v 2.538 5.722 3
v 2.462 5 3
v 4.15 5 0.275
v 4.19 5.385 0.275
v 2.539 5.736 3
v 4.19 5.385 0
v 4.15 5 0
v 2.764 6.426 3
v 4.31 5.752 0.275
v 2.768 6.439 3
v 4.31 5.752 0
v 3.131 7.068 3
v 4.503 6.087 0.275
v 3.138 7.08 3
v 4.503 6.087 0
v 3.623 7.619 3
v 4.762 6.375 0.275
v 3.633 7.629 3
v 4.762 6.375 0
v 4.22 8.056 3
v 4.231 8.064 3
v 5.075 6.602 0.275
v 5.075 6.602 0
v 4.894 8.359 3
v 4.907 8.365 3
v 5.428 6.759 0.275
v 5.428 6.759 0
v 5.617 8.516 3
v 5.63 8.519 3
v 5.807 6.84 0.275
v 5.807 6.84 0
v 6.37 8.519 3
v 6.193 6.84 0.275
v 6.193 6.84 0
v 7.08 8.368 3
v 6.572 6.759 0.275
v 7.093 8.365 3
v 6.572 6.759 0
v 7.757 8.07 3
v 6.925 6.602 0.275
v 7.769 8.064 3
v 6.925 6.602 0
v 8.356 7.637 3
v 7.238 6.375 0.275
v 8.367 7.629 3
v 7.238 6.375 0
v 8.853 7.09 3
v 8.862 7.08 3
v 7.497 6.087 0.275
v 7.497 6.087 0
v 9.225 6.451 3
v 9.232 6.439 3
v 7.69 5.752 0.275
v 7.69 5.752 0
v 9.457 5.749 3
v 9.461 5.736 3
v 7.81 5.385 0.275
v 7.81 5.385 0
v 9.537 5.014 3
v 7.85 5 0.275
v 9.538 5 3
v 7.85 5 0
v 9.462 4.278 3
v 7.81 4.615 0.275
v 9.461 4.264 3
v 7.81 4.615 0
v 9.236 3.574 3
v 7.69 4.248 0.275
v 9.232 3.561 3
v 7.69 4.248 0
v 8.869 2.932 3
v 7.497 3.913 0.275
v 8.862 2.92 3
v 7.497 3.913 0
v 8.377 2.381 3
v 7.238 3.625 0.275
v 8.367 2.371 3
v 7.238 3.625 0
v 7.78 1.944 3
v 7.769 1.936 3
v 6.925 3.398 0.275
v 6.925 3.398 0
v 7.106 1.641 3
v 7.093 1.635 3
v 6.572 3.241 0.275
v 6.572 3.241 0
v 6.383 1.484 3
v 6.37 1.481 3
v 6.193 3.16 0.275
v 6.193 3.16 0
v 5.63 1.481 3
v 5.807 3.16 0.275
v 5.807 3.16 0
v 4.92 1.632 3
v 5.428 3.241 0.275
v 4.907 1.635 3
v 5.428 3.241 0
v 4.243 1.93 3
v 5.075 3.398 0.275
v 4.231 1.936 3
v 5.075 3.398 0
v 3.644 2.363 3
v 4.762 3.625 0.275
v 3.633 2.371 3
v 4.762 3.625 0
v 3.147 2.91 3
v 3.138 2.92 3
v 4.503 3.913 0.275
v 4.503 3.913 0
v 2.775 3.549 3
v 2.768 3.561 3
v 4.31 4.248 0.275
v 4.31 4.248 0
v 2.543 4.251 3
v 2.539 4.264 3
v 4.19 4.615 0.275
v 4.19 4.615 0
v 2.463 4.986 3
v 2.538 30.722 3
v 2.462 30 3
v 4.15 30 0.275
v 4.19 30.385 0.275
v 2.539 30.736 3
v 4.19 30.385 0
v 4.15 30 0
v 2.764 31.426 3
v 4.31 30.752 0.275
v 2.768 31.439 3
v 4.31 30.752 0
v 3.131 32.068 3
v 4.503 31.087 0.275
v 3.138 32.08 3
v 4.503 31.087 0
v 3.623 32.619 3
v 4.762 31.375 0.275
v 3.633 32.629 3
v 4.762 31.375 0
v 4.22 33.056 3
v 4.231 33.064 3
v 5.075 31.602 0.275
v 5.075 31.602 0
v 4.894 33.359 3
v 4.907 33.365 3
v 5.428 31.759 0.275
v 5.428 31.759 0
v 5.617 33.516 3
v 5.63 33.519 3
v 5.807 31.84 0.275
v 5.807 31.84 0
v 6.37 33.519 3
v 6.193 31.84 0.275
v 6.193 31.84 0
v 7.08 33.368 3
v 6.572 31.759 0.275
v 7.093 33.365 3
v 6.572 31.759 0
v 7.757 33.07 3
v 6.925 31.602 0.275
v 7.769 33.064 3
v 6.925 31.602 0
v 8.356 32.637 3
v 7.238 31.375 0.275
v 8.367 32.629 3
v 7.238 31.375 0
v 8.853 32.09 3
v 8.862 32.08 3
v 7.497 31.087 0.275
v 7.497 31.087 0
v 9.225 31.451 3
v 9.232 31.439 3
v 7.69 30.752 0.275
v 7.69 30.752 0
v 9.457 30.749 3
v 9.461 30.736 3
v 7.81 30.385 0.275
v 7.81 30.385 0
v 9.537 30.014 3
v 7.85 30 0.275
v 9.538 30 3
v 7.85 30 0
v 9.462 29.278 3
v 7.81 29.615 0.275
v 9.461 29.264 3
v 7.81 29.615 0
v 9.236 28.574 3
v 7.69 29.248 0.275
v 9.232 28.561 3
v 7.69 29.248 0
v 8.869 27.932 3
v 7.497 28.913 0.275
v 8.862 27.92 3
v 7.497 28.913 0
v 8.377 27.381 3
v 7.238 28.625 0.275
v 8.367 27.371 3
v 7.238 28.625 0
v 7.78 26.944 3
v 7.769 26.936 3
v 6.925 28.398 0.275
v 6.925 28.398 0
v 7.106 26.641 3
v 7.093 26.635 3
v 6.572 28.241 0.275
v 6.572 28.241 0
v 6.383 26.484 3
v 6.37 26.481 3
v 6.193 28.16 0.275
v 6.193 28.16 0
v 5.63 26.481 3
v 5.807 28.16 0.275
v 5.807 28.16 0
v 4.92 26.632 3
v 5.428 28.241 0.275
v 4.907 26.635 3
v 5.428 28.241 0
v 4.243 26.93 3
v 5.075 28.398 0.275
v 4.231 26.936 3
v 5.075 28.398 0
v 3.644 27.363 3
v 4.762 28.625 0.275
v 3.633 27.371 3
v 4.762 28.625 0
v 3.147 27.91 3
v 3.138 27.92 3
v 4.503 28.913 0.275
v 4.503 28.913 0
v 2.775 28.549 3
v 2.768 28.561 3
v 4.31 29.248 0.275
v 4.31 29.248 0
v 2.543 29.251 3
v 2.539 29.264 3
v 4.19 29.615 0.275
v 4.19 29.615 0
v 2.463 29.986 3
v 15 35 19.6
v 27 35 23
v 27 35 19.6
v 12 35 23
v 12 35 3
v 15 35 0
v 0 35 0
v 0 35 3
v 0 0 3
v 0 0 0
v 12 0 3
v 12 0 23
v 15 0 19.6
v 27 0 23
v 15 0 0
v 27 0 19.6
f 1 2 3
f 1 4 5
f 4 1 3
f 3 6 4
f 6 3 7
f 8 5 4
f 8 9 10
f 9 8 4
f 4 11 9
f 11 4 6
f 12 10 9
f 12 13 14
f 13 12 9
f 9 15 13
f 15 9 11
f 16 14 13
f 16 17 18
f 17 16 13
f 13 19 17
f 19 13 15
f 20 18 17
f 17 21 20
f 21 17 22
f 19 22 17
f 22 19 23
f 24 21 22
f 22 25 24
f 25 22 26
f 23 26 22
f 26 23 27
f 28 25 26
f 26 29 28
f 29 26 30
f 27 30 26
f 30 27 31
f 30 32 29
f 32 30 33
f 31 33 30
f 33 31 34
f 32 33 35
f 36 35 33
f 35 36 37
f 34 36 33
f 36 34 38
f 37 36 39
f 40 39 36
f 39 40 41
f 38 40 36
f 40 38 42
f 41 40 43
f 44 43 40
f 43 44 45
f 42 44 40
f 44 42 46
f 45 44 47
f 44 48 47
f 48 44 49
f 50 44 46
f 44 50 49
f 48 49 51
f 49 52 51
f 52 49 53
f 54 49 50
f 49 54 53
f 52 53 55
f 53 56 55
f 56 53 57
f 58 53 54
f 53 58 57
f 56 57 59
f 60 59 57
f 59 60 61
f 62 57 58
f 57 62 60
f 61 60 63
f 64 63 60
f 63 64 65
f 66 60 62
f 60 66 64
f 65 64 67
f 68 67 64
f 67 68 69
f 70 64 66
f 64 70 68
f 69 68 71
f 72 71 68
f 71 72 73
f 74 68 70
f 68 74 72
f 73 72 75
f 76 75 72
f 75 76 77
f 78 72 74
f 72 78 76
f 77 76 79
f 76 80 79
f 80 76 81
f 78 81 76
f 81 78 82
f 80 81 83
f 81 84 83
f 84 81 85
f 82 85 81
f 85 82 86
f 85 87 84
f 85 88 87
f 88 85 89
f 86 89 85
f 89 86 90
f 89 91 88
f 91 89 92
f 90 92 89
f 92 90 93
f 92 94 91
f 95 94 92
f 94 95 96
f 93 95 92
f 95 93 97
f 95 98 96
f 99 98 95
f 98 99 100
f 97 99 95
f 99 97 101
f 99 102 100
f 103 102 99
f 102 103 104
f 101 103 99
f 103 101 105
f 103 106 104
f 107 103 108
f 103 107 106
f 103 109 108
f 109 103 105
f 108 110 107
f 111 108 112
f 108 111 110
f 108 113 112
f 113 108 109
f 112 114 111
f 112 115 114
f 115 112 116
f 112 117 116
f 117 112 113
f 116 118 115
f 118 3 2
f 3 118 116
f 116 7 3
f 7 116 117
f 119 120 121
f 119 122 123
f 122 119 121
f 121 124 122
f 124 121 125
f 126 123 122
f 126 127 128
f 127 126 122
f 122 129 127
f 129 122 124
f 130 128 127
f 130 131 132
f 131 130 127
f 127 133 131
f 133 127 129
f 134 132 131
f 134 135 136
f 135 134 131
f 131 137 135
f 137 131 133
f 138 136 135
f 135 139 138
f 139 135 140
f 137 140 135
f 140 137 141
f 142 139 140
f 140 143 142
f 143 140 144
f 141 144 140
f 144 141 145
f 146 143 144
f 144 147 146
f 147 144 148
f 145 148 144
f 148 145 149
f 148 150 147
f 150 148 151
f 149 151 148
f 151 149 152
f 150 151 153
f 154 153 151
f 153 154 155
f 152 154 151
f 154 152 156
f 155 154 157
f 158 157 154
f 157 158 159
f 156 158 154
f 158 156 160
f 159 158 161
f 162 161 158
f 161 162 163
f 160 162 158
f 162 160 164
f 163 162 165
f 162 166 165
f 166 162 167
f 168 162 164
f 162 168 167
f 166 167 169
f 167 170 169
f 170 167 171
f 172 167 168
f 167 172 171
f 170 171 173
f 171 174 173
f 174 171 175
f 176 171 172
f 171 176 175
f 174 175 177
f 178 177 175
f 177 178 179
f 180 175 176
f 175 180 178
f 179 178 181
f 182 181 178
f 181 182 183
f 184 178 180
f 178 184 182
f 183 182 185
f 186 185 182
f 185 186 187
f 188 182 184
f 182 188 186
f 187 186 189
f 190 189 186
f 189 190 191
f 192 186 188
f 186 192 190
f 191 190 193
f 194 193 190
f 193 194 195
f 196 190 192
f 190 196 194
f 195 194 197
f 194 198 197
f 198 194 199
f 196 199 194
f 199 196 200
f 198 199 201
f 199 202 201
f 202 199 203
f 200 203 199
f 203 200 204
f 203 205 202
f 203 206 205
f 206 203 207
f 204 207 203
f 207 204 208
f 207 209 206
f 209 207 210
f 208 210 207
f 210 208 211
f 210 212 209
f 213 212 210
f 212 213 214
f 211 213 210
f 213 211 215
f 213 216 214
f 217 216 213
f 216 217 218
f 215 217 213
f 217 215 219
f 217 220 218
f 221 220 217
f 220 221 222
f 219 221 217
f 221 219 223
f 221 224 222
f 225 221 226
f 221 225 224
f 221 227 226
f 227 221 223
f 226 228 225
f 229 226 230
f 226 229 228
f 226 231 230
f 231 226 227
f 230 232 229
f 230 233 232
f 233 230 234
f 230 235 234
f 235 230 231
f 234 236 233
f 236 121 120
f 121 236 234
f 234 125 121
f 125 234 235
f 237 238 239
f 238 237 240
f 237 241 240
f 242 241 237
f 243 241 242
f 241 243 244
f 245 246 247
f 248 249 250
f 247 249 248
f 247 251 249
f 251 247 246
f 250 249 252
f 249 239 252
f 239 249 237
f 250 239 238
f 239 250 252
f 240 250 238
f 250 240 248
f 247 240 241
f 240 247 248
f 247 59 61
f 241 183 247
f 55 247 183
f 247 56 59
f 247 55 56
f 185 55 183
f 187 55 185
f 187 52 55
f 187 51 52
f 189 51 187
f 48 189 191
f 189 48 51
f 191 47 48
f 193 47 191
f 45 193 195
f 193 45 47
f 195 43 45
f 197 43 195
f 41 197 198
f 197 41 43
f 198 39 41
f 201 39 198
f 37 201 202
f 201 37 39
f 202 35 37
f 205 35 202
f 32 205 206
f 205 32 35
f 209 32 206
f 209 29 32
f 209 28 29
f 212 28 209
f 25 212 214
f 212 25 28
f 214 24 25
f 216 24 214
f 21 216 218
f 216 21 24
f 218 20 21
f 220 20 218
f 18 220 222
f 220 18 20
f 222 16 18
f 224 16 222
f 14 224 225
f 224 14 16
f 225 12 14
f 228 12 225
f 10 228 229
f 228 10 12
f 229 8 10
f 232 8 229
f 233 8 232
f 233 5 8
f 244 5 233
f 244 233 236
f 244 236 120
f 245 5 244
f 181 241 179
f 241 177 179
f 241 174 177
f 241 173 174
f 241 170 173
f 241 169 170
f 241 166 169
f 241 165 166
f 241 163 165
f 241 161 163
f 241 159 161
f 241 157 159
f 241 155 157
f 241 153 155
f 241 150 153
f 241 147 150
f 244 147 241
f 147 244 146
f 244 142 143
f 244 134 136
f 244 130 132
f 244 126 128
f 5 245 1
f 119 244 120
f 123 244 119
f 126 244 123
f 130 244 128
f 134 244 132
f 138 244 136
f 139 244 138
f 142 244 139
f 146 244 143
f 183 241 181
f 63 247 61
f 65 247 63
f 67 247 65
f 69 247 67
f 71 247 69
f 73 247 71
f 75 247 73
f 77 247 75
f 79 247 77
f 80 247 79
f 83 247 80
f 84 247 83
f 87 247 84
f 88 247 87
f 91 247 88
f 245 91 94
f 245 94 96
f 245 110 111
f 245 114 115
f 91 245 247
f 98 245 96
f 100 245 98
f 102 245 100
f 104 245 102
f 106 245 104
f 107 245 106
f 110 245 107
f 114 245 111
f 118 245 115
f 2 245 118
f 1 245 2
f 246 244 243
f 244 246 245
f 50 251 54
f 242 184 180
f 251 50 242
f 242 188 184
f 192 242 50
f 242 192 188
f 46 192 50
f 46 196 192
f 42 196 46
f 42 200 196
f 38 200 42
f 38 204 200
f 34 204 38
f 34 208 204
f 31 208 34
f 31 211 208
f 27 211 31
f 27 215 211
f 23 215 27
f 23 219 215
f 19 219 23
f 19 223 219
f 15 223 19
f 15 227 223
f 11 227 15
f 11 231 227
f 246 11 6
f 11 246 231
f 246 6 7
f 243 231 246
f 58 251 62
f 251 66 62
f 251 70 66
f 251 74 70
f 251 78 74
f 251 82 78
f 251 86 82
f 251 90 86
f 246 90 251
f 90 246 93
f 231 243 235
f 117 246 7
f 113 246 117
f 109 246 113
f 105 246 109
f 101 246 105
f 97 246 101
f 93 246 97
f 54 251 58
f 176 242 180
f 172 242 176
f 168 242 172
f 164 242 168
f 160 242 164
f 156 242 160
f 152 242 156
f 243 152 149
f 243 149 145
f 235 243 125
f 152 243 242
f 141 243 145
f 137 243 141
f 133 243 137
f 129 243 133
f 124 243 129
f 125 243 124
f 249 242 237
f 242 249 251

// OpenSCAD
// file: Parts/Screw.scad
// created by IndiePandaaaaa | Lukas

function cone_diameter(diameter) = diameter * 2;

function cone_height(diameter) = diameter * 0.75;

module screw(diameter, length, cutout_sample = false, fs = 0.1, fa = 1) {
    //$fs = 0.1; [size in mm] | $fa = 1; [degrees]
    //$fn = 100; [defined faces]

    module base_model(diameter, length, cone_height, cone_diameter, offset = 0, fs = 0.1, fa = 1) {
        rotate_extrude($fs = fs) {
            polygon([
                    [0, 0],
                    [(diameter + offset) / 2, 0],
                    [(diameter + offset) / 2, (length + offset) - (cone_height + offset)],
                    [(cone_diameter + offset) / 2, length + offset],
                    [0, length + offset],
                ]);
        }
    }

    if (length < diameter) {
        echo("Screw is too short");
        length = diameter + 1;
        echo("New length is: ", length);
    }

    if (!cutout_sample) {
        translate([0, 0, - length])
            difference() {
                base_model(diameter, length, cone_height(diameter), cone_diameter(diameter));

                // top cross part
                translate([0, 0, length + 0.1 - (cone_height(diameter) - diameter / 2)])
                    difference() {
                        rotate([0, 0, 45])
                            rotate_extrude($fn = 4) {
                                polygon([
                                        [0, 0],
                                        [diameter * 1.4 / 2, 0],
                                        [cone_diameter(diameter) / 2, cone_height(diameter) - diameter / 2],
                                        [0, cone_height(diameter) - diameter / 2],
                                    ]);
                            }
                        for (i = [0 : 1 : 3]) {
                            rotate([0, 0, 90 * i])
                                translate([diameter / 3.18 / 2, diameter / 3.18 / 2, - 0.1])
                                    cube(cone_height(diameter) + 0.2);
                        }
                    }
            }
    } else {
        offset = 0.2;
        translate([0, 0, - length - offset / 2])
            base_model(diameter, length, cone_height(diameter), cone_diameter(diameter), offset);
    }
}

screw(3.5, 12);
// main file
// created by IndiePandaaaaa|Lukas

use <Parts/Screw.scad>

TOLERANCE = 0.1;
THICKNESS = 3;
SCREW_OD = 3.5;

SCREWS_2 = true;
SCREWS_2_DIST = 25;  // fixme: 2.54 ??

BRACKET_INNER_HEIGHT = 20;
BRACKET_SCREW_DEPTH = 12;
BRACKET_UPPER_WIDTH = 12;
BRACKET_WIDTH = SCREWS_2_DIST + SCREW_OD * 2 + 1.5 * 2; // if too low SCREWS_2 has priority

difference() {
    translate([0, BRACKET_WIDTH, 0]) rotate([90, 0, 0])
        linear_extrude(BRACKET_WIDTH) {
            polygon([
                    [0, 0],
                    [BRACKET_SCREW_DEPTH + THICKNESS, 0],
                    [BRACKET_SCREW_DEPTH + THICKNESS, BRACKET_INNER_HEIGHT + TOLERANCE - 0.5],
                // -0.5 fitting for device
                    [BRACKET_SCREW_DEPTH + THICKNESS + BRACKET_UPPER_WIDTH, BRACKET_INNER_HEIGHT + TOLERANCE - 0.5],
                    [BRACKET_SCREW_DEPTH + THICKNESS + BRACKET_UPPER_WIDTH, BRACKET_INNER_HEIGHT + THICKNESS],
                    [BRACKET_SCREW_DEPTH, BRACKET_INNER_HEIGHT + THICKNESS],
                    [BRACKET_SCREW_DEPTH, THICKNESS],
                    [0, THICKNESS],
                ]);
        }

    for (i = [0:1]) {
        if (SCREWS_2) {
            translate([BRACKET_SCREW_DEPTH / 2,
                    (BRACKET_WIDTH - SCREWS_2_DIST - SCREW_OD - 1.5) + SCREWS_2_DIST * i, THICKNESS])
                screw(SCREW_OD, 12, true);
        } else {
            translate([BRACKET_SCREW_DEPTH / 2, BRACKET_WIDTH / 2, THICKNESS])
                screw(SCREW_OD, 12, true);
        }
    }
}
